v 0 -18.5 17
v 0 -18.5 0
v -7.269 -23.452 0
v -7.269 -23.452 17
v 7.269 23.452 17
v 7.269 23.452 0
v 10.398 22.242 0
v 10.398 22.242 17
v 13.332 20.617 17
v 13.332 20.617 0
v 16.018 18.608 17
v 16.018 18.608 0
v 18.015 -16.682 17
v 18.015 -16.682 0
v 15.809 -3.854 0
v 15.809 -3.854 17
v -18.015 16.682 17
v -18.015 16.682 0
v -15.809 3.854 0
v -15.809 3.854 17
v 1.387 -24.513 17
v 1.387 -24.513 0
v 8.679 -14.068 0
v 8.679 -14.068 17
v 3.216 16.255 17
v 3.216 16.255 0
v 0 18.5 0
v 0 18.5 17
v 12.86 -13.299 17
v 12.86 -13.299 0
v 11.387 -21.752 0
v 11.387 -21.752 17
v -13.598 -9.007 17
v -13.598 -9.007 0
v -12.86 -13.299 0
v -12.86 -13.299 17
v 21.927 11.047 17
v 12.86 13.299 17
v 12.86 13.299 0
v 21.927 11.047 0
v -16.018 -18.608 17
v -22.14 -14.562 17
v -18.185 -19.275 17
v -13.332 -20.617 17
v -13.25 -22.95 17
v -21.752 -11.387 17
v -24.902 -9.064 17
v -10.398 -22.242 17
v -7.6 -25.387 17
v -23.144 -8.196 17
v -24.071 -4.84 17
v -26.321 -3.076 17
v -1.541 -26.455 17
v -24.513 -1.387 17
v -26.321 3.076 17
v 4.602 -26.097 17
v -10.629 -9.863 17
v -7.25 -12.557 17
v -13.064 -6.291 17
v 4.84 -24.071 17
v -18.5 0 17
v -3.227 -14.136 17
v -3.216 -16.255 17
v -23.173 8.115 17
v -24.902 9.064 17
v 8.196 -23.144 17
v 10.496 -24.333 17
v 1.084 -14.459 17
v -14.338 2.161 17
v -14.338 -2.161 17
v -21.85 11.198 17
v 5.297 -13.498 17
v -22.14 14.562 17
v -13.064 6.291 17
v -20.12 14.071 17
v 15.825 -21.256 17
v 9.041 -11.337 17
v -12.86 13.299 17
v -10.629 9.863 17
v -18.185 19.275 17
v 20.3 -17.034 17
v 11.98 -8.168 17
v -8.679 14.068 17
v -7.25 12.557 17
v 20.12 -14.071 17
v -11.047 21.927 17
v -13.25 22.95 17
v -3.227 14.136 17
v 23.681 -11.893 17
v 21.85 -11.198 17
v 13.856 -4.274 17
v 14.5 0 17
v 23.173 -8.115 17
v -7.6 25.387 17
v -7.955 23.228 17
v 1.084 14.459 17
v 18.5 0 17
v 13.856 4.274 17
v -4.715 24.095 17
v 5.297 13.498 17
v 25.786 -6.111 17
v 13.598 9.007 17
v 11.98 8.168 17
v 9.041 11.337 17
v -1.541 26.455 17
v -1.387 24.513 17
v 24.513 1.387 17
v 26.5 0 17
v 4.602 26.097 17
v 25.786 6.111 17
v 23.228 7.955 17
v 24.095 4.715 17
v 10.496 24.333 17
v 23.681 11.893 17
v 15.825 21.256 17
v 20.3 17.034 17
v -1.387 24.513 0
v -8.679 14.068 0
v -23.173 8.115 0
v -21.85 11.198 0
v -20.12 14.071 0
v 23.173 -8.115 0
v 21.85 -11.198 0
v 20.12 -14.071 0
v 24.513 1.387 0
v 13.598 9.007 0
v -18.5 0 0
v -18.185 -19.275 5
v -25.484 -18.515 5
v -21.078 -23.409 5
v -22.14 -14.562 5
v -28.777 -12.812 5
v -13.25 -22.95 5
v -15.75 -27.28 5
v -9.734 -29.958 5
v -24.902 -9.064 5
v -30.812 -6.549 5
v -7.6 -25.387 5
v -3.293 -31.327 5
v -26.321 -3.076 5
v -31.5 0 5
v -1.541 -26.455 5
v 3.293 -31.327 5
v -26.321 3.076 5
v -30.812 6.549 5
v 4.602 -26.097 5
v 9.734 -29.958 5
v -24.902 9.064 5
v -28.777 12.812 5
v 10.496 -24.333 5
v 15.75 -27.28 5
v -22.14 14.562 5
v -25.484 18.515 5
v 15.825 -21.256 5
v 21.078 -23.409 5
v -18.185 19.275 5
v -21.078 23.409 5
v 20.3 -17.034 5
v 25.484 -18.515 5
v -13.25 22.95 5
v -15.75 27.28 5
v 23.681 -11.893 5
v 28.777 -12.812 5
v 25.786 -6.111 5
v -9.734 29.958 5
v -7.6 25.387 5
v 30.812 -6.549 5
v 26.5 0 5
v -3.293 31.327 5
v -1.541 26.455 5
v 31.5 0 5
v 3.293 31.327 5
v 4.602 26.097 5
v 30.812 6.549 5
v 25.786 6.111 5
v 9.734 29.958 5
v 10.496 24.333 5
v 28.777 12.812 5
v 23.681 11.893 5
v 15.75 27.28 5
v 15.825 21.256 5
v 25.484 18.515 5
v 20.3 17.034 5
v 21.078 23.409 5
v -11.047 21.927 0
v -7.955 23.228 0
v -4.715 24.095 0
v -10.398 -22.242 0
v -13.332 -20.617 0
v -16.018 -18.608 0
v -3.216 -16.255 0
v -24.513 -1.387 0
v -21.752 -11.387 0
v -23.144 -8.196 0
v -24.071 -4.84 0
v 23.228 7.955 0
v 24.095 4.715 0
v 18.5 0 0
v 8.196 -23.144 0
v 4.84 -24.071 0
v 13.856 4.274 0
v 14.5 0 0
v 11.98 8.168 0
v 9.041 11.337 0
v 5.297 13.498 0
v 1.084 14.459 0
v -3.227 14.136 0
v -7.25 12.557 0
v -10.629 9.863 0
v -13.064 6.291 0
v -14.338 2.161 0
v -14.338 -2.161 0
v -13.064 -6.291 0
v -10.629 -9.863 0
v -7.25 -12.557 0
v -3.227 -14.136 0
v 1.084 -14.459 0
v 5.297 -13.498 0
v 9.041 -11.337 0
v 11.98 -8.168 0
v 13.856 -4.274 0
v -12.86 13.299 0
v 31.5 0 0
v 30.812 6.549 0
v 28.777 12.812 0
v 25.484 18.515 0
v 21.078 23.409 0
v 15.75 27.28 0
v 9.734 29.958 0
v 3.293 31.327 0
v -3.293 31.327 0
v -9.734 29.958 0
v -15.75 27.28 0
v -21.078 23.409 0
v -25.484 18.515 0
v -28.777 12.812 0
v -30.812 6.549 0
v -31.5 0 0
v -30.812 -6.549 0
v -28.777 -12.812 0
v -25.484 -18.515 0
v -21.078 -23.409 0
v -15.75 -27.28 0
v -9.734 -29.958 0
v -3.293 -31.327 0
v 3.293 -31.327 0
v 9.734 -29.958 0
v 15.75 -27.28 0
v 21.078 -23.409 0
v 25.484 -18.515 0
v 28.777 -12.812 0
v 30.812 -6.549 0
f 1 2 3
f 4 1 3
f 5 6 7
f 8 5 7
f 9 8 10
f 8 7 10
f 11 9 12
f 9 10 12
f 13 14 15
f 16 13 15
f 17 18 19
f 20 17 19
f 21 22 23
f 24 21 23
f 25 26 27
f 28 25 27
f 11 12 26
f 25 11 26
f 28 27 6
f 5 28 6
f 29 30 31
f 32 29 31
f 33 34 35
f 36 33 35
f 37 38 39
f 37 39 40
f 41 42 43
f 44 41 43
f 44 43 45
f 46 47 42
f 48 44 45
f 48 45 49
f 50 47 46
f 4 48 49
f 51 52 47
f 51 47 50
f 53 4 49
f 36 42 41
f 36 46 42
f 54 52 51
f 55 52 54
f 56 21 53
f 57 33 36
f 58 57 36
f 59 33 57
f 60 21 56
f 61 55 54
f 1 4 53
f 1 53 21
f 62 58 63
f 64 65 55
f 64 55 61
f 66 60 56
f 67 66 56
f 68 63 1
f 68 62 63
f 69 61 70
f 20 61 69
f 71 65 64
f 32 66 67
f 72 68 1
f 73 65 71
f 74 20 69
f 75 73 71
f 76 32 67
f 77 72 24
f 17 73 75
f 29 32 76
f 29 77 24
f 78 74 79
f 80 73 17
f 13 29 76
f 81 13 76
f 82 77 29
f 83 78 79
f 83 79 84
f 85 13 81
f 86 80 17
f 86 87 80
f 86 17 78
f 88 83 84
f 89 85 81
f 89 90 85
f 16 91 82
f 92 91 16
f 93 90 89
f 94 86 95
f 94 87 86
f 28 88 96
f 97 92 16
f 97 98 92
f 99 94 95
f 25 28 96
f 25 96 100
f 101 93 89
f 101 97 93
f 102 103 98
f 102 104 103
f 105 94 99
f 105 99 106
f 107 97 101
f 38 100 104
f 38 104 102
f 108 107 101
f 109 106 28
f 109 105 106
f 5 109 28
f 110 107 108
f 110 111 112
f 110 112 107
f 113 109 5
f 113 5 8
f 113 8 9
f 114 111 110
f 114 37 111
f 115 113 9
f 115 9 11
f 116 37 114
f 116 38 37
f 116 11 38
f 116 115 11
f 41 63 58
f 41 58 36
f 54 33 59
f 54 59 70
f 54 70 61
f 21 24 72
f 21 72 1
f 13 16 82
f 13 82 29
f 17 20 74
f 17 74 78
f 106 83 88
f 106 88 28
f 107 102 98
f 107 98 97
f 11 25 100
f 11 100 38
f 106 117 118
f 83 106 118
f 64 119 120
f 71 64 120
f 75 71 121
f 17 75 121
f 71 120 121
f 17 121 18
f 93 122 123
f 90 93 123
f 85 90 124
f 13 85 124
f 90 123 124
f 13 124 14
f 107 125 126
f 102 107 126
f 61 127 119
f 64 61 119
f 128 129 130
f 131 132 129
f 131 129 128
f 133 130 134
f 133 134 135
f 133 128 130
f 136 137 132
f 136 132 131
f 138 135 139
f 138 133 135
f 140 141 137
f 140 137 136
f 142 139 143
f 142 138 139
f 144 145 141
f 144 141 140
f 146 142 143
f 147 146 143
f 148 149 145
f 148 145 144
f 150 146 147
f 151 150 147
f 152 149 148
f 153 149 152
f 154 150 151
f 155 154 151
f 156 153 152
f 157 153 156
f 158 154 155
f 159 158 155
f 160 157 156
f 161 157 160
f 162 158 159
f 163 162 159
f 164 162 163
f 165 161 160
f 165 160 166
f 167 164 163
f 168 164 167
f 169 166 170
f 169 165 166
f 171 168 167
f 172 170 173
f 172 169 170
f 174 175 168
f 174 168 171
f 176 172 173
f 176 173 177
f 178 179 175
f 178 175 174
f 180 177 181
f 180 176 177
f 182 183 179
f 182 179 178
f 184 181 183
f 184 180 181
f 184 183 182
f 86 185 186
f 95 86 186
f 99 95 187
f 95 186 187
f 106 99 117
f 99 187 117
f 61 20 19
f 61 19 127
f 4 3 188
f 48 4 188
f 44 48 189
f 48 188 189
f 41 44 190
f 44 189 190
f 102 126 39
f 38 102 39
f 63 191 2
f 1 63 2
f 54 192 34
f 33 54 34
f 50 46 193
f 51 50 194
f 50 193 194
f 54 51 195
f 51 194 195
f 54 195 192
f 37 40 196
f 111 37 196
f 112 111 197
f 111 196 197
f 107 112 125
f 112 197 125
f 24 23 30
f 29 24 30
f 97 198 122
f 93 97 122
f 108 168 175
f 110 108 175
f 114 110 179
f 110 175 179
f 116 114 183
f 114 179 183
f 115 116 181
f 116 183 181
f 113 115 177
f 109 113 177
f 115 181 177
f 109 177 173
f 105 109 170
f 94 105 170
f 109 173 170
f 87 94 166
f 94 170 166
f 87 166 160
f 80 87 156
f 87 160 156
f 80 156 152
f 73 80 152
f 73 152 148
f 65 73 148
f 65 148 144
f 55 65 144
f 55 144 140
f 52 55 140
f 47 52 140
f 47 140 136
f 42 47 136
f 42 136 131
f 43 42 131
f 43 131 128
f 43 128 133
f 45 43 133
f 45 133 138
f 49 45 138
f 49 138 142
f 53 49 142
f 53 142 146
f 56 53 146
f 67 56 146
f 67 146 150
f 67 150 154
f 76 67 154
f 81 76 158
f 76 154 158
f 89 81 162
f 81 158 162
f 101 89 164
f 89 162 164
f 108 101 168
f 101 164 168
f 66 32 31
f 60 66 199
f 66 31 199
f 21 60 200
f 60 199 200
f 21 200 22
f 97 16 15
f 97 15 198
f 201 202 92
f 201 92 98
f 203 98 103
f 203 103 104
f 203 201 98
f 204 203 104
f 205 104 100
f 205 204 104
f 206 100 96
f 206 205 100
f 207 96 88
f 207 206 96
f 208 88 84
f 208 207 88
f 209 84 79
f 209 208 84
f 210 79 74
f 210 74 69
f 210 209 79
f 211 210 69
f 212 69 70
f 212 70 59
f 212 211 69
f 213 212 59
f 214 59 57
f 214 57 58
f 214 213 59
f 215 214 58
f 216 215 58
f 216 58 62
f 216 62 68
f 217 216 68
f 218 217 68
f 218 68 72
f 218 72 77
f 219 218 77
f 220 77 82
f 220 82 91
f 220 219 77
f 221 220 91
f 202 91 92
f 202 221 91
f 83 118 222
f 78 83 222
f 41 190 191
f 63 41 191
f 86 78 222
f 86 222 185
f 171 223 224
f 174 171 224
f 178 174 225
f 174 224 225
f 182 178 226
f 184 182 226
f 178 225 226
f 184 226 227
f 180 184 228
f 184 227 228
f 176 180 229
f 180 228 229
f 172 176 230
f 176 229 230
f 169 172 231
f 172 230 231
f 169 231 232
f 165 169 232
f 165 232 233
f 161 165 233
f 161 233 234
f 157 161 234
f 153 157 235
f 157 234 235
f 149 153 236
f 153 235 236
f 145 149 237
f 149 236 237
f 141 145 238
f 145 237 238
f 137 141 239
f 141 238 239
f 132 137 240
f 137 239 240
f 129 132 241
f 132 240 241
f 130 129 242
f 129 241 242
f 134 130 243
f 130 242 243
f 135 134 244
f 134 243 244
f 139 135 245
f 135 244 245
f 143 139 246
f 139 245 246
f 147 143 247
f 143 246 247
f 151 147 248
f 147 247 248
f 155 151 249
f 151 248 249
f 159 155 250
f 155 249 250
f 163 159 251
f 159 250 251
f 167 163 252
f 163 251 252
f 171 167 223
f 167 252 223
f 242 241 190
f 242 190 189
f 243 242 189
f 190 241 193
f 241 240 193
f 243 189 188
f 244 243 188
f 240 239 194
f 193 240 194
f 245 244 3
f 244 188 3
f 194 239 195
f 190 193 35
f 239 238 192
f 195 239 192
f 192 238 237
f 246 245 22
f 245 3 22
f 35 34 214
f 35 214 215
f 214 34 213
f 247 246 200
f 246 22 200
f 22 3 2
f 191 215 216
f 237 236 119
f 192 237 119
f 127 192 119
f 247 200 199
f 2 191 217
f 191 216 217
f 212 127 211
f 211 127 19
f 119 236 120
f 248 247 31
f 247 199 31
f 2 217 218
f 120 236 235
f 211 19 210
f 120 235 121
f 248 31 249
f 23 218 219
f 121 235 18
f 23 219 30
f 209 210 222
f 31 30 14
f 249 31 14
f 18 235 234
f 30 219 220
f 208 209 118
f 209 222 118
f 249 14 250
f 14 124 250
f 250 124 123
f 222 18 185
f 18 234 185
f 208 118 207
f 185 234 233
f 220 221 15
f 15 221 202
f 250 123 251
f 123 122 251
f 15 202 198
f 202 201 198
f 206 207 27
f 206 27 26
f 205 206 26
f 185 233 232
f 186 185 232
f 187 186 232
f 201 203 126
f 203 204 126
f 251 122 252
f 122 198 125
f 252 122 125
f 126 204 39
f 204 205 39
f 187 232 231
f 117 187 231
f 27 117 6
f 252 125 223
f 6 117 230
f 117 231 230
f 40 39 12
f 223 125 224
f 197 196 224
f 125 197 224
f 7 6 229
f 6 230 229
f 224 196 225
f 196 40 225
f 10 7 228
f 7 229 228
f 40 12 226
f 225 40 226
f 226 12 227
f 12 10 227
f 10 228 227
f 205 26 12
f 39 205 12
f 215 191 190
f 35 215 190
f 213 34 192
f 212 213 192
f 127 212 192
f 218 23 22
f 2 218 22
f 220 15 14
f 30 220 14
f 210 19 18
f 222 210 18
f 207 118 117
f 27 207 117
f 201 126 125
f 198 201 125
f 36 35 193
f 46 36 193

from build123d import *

# Parameters (mm, degrees)
F0_R     = 26.5
F0_R_2   = 14.5
F1_DEPTH = 17
F0_R_3   = 31.5
F2_DEPTH = 5
F3_DEPTH = 17


with BuildPart() as f1:
    # F0 (on Top) → F1 (new body)
    with BuildSketch(Plane.XY):
        Circle(F0_R)
        with BuildLine():
            Line((-3.216465, -16.254543), (0, -18.5))
            Line((0, -18.5), (-7.269078, -23.451694))
            ThreePointArc((-7.269078, -23.451694), (-11.892593, -21.479937), (-16.01768, -18.607939))
            Line((-16.01768, -18.607939), (-3.216465, -16.254543))
        make_face(mode=Mode.SUBTRACT)
        with BuildLine():
            Line((-13.598169, -9.006938), (-12.86031, -13.298963))
            Line((-12.86031, -13.298963), (-21.752187, -11.387001))
            ThreePointArc((-21.752187, -11.387001), (-23.666893, -6.534493), (-24.513214, -1.387001))
            Line((-24.513214, -1.387001), (-13.598169, -9.006938))
        make_face(mode=Mode.SUBTRACT)
        with BuildLine():
            Line((8.679206, -14.067624), (12.86031, -13.298963))
            Line((12.86031, -13.298963), (11.387001, -21.752187))
            ThreePointArc((11.387001, -21.752187), (6.534493, -23.666893), (1.387001, -24.513214))
            Line((1.387001, -24.513214), (8.679206, -14.067624))
        make_face(mode=Mode.SUBTRACT)
        with BuildLine():
            Line((15.809209, -3.854376), (18.5, 0))
            Line((18.5, 0), (23.172504, -8.115203))
            ThreePointArc((23.172504, -8.115203), (21.034287, -12.664131), (18.014507, -16.682295))
            Line((18.014507, -16.682295), (15.809209, -3.854376))
        make_face(mode=Mode.SUBTRACT)
        with BuildLine():
            Line((-15.809209, 3.854376), (-18.5, 0))
            Line((-18.5, 0), (-23.172504, 8.115203))
            ThreePointArc((-23.172504, 8.115203), (-21.034287, 12.664131), (-18.014507, 16.682295))
            Line((-18.014507, 16.682295), (-15.809209, 3.854376))
        make_face(mode=Mode.SUBTRACT)
        with BuildLine():
            Line((-8.679206, 14.067624), (-12.86031, 13.298963))
            Line((-12.86031, 13.298963), (-11.04677, 21.926931))
            ThreePointArc((-11.04677, 21.926931), (-6.349952, 23.717073), (-1.387001, 24.513214))
            Line((-1.387001, 24.513214), (-8.679206, 14.067624))
        make_face(mode=Mode.SUBTRACT)
        Circle(F0_R_2, mode=Mode.SUBTRACT)
        with BuildLine():
            Line((13.598169, 9.006938), (12.86031, 13.298963))
            Line((12.86031, 13.298963), (21.926931, 11.04677))
            ThreePointArc((21.926931, 11.04677), (23.717073, 6.349952), (24.513214, 1.387001))
            Line((24.513214, 1.387001), (13.598169, 9.006938))
        make_face(mode=Mode.SUBTRACT)
        with BuildLine():
            Line((3.216465, 16.254543), (0, 18.5))
            Line((0, 18.5), (7.269078, 23.451694))
            ThreePointArc((7.269078, 23.451694), (11.892593, 21.479937), (16.01768, 18.607939))
            Line((16.01768, 18.607939), (3.216465, 16.254543))
        make_face(mode=Mode.SUBTRACT)
    extrude(amount=F1_DEPTH)

    # F0 (on Top) → F2 (join)
    with BuildSketch(Plane.XY):
        Circle(F0_R_3)
        Circle(F0_R, mode=Mode.SUBTRACT)
    extrude(amount=F2_DEPTH)

    # F0 (on Top) → F3 (cut)
    with BuildSketch(Plane.XY):
        with BuildLine():
            Line((23.172504, -8.115203), (18.5, 0))
            Line((18.5, 0), (15.809209, -3.854376))
            Line((15.809209, -3.854376), (18.014507, -16.682295))
            ThreePointArc((18.014507, -16.682295), (21.034287, -12.664131), (23.172504, -8.115203))
        make_face()
        with BuildLine():
            Line((11.387001, -21.752187), (12.86031, -13.298963))
            Line((12.86031, -13.298963), (8.679206, -14.067624))
            Line((8.679206, -14.067624), (1.387001, -24.513214))
            ThreePointArc((1.387001, -24.513214), (6.534493, -23.666893), (11.387001, -21.752187))
        make_face()
        with BuildLine():
            Line((-7.269078, -23.451694), (0, -18.5))
            Line((0, -18.5), (-3.216465, -16.254543))
            Line((-3.216465, -16.254543), (-16.01768, -18.607939))
            ThreePointArc((-16.01768, -18.607939), (-11.892593, -21.479937), (-7.269078, -23.451694))
        make_face()
        with BuildLine():
            Line((-21.752187, -11.387001), (-12.86031, -13.298963))
            Line((-12.86031, -13.298963), (-13.598169, -9.006938))
            Line((-13.598169, -9.006938), (-24.513214, -1.387001))
            ThreePointArc((-24.513214, -1.387001), (-23.666893, -6.534493), (-21.752187, -11.387001))
        make_face()
        with BuildLine():
            Line((-23.172504, 8.115203), (-18.5, 0))
            Line((-18.5, 0), (-15.809209, 3.854376))
            Line((-15.809209, 3.854376), (-18.014507, 16.682295))
            ThreePointArc((-18.014507, 16.682295), (-21.034287, 12.664131), (-23.172504, 8.115203))
        make_face()
        with BuildLine():
            Line((-11.04677, 21.926931), (-12.86031, 13.298963))
            Line((-12.86031, 13.298963), (-8.679206, 14.067624))
            Line((-8.679206, 14.067624), (-1.387001, 24.513214))
            ThreePointArc((-1.387001, 24.513214), (-6.349952, 23.717073), (-11.04677, 21.926931))
        make_face()
        with BuildLine():
            Line((7.269078, 23.451694), (0, 18.5))
            Line((0, 18.5), (3.216465, 16.254543))
            Line((3.216465, 16.254543), (16.01768, 18.607939))
            ThreePointArc((16.01768, 18.607939), (11.892593, 21.479937), (7.269078, 23.451694))
        make_face()
        with BuildLine():
            Line((21.926931, 11.04677), (12.86031, 13.298963))
            Line((12.86031, 13.298963), (13.598169, 9.006938))
            Line((13.598169, 9.006938), (24.513214, 1.387001))
            ThreePointArc((24.513214, 1.387001), (23.717073, 6.349952), (21.926931, 11.04677))
        make_face()
    extrude(amount=F3_DEPTH, mode=Mode.SUBTRACT)


solid = f1.part
